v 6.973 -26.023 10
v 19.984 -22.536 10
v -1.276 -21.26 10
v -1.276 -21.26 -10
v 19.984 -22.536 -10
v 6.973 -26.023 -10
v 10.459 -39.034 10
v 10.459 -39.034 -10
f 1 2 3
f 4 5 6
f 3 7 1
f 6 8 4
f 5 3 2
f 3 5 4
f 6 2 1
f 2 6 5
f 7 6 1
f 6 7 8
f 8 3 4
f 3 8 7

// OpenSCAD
polyhedron(
    points=[
    [-1.27610802895322, -21.2602839420936, 10],
    [19.9841759131403, -22.5363919710468, 10],
    [6.97278394209356, -26.0227839420936, 10],
    [10.4591759131403, -39.0341759131403, 10],
    [-1.27610802895322, -21.2602839420936, -10],
    [19.9841759131403, -22.5363919710468, -10],
    [6.97278394209356, -26.0227839420936, -10],
    [10.4591759131403, -39.0341759131403, -10],
    ],
    faces=[
        [0,1,2],
        [6,5,4],
        [2,3,0],
        [4,7,6],
        [0,4,5,1],
        [1,5,6,2],
        [2,6,7,3],
        [3,7,4,0],
    ]
);
